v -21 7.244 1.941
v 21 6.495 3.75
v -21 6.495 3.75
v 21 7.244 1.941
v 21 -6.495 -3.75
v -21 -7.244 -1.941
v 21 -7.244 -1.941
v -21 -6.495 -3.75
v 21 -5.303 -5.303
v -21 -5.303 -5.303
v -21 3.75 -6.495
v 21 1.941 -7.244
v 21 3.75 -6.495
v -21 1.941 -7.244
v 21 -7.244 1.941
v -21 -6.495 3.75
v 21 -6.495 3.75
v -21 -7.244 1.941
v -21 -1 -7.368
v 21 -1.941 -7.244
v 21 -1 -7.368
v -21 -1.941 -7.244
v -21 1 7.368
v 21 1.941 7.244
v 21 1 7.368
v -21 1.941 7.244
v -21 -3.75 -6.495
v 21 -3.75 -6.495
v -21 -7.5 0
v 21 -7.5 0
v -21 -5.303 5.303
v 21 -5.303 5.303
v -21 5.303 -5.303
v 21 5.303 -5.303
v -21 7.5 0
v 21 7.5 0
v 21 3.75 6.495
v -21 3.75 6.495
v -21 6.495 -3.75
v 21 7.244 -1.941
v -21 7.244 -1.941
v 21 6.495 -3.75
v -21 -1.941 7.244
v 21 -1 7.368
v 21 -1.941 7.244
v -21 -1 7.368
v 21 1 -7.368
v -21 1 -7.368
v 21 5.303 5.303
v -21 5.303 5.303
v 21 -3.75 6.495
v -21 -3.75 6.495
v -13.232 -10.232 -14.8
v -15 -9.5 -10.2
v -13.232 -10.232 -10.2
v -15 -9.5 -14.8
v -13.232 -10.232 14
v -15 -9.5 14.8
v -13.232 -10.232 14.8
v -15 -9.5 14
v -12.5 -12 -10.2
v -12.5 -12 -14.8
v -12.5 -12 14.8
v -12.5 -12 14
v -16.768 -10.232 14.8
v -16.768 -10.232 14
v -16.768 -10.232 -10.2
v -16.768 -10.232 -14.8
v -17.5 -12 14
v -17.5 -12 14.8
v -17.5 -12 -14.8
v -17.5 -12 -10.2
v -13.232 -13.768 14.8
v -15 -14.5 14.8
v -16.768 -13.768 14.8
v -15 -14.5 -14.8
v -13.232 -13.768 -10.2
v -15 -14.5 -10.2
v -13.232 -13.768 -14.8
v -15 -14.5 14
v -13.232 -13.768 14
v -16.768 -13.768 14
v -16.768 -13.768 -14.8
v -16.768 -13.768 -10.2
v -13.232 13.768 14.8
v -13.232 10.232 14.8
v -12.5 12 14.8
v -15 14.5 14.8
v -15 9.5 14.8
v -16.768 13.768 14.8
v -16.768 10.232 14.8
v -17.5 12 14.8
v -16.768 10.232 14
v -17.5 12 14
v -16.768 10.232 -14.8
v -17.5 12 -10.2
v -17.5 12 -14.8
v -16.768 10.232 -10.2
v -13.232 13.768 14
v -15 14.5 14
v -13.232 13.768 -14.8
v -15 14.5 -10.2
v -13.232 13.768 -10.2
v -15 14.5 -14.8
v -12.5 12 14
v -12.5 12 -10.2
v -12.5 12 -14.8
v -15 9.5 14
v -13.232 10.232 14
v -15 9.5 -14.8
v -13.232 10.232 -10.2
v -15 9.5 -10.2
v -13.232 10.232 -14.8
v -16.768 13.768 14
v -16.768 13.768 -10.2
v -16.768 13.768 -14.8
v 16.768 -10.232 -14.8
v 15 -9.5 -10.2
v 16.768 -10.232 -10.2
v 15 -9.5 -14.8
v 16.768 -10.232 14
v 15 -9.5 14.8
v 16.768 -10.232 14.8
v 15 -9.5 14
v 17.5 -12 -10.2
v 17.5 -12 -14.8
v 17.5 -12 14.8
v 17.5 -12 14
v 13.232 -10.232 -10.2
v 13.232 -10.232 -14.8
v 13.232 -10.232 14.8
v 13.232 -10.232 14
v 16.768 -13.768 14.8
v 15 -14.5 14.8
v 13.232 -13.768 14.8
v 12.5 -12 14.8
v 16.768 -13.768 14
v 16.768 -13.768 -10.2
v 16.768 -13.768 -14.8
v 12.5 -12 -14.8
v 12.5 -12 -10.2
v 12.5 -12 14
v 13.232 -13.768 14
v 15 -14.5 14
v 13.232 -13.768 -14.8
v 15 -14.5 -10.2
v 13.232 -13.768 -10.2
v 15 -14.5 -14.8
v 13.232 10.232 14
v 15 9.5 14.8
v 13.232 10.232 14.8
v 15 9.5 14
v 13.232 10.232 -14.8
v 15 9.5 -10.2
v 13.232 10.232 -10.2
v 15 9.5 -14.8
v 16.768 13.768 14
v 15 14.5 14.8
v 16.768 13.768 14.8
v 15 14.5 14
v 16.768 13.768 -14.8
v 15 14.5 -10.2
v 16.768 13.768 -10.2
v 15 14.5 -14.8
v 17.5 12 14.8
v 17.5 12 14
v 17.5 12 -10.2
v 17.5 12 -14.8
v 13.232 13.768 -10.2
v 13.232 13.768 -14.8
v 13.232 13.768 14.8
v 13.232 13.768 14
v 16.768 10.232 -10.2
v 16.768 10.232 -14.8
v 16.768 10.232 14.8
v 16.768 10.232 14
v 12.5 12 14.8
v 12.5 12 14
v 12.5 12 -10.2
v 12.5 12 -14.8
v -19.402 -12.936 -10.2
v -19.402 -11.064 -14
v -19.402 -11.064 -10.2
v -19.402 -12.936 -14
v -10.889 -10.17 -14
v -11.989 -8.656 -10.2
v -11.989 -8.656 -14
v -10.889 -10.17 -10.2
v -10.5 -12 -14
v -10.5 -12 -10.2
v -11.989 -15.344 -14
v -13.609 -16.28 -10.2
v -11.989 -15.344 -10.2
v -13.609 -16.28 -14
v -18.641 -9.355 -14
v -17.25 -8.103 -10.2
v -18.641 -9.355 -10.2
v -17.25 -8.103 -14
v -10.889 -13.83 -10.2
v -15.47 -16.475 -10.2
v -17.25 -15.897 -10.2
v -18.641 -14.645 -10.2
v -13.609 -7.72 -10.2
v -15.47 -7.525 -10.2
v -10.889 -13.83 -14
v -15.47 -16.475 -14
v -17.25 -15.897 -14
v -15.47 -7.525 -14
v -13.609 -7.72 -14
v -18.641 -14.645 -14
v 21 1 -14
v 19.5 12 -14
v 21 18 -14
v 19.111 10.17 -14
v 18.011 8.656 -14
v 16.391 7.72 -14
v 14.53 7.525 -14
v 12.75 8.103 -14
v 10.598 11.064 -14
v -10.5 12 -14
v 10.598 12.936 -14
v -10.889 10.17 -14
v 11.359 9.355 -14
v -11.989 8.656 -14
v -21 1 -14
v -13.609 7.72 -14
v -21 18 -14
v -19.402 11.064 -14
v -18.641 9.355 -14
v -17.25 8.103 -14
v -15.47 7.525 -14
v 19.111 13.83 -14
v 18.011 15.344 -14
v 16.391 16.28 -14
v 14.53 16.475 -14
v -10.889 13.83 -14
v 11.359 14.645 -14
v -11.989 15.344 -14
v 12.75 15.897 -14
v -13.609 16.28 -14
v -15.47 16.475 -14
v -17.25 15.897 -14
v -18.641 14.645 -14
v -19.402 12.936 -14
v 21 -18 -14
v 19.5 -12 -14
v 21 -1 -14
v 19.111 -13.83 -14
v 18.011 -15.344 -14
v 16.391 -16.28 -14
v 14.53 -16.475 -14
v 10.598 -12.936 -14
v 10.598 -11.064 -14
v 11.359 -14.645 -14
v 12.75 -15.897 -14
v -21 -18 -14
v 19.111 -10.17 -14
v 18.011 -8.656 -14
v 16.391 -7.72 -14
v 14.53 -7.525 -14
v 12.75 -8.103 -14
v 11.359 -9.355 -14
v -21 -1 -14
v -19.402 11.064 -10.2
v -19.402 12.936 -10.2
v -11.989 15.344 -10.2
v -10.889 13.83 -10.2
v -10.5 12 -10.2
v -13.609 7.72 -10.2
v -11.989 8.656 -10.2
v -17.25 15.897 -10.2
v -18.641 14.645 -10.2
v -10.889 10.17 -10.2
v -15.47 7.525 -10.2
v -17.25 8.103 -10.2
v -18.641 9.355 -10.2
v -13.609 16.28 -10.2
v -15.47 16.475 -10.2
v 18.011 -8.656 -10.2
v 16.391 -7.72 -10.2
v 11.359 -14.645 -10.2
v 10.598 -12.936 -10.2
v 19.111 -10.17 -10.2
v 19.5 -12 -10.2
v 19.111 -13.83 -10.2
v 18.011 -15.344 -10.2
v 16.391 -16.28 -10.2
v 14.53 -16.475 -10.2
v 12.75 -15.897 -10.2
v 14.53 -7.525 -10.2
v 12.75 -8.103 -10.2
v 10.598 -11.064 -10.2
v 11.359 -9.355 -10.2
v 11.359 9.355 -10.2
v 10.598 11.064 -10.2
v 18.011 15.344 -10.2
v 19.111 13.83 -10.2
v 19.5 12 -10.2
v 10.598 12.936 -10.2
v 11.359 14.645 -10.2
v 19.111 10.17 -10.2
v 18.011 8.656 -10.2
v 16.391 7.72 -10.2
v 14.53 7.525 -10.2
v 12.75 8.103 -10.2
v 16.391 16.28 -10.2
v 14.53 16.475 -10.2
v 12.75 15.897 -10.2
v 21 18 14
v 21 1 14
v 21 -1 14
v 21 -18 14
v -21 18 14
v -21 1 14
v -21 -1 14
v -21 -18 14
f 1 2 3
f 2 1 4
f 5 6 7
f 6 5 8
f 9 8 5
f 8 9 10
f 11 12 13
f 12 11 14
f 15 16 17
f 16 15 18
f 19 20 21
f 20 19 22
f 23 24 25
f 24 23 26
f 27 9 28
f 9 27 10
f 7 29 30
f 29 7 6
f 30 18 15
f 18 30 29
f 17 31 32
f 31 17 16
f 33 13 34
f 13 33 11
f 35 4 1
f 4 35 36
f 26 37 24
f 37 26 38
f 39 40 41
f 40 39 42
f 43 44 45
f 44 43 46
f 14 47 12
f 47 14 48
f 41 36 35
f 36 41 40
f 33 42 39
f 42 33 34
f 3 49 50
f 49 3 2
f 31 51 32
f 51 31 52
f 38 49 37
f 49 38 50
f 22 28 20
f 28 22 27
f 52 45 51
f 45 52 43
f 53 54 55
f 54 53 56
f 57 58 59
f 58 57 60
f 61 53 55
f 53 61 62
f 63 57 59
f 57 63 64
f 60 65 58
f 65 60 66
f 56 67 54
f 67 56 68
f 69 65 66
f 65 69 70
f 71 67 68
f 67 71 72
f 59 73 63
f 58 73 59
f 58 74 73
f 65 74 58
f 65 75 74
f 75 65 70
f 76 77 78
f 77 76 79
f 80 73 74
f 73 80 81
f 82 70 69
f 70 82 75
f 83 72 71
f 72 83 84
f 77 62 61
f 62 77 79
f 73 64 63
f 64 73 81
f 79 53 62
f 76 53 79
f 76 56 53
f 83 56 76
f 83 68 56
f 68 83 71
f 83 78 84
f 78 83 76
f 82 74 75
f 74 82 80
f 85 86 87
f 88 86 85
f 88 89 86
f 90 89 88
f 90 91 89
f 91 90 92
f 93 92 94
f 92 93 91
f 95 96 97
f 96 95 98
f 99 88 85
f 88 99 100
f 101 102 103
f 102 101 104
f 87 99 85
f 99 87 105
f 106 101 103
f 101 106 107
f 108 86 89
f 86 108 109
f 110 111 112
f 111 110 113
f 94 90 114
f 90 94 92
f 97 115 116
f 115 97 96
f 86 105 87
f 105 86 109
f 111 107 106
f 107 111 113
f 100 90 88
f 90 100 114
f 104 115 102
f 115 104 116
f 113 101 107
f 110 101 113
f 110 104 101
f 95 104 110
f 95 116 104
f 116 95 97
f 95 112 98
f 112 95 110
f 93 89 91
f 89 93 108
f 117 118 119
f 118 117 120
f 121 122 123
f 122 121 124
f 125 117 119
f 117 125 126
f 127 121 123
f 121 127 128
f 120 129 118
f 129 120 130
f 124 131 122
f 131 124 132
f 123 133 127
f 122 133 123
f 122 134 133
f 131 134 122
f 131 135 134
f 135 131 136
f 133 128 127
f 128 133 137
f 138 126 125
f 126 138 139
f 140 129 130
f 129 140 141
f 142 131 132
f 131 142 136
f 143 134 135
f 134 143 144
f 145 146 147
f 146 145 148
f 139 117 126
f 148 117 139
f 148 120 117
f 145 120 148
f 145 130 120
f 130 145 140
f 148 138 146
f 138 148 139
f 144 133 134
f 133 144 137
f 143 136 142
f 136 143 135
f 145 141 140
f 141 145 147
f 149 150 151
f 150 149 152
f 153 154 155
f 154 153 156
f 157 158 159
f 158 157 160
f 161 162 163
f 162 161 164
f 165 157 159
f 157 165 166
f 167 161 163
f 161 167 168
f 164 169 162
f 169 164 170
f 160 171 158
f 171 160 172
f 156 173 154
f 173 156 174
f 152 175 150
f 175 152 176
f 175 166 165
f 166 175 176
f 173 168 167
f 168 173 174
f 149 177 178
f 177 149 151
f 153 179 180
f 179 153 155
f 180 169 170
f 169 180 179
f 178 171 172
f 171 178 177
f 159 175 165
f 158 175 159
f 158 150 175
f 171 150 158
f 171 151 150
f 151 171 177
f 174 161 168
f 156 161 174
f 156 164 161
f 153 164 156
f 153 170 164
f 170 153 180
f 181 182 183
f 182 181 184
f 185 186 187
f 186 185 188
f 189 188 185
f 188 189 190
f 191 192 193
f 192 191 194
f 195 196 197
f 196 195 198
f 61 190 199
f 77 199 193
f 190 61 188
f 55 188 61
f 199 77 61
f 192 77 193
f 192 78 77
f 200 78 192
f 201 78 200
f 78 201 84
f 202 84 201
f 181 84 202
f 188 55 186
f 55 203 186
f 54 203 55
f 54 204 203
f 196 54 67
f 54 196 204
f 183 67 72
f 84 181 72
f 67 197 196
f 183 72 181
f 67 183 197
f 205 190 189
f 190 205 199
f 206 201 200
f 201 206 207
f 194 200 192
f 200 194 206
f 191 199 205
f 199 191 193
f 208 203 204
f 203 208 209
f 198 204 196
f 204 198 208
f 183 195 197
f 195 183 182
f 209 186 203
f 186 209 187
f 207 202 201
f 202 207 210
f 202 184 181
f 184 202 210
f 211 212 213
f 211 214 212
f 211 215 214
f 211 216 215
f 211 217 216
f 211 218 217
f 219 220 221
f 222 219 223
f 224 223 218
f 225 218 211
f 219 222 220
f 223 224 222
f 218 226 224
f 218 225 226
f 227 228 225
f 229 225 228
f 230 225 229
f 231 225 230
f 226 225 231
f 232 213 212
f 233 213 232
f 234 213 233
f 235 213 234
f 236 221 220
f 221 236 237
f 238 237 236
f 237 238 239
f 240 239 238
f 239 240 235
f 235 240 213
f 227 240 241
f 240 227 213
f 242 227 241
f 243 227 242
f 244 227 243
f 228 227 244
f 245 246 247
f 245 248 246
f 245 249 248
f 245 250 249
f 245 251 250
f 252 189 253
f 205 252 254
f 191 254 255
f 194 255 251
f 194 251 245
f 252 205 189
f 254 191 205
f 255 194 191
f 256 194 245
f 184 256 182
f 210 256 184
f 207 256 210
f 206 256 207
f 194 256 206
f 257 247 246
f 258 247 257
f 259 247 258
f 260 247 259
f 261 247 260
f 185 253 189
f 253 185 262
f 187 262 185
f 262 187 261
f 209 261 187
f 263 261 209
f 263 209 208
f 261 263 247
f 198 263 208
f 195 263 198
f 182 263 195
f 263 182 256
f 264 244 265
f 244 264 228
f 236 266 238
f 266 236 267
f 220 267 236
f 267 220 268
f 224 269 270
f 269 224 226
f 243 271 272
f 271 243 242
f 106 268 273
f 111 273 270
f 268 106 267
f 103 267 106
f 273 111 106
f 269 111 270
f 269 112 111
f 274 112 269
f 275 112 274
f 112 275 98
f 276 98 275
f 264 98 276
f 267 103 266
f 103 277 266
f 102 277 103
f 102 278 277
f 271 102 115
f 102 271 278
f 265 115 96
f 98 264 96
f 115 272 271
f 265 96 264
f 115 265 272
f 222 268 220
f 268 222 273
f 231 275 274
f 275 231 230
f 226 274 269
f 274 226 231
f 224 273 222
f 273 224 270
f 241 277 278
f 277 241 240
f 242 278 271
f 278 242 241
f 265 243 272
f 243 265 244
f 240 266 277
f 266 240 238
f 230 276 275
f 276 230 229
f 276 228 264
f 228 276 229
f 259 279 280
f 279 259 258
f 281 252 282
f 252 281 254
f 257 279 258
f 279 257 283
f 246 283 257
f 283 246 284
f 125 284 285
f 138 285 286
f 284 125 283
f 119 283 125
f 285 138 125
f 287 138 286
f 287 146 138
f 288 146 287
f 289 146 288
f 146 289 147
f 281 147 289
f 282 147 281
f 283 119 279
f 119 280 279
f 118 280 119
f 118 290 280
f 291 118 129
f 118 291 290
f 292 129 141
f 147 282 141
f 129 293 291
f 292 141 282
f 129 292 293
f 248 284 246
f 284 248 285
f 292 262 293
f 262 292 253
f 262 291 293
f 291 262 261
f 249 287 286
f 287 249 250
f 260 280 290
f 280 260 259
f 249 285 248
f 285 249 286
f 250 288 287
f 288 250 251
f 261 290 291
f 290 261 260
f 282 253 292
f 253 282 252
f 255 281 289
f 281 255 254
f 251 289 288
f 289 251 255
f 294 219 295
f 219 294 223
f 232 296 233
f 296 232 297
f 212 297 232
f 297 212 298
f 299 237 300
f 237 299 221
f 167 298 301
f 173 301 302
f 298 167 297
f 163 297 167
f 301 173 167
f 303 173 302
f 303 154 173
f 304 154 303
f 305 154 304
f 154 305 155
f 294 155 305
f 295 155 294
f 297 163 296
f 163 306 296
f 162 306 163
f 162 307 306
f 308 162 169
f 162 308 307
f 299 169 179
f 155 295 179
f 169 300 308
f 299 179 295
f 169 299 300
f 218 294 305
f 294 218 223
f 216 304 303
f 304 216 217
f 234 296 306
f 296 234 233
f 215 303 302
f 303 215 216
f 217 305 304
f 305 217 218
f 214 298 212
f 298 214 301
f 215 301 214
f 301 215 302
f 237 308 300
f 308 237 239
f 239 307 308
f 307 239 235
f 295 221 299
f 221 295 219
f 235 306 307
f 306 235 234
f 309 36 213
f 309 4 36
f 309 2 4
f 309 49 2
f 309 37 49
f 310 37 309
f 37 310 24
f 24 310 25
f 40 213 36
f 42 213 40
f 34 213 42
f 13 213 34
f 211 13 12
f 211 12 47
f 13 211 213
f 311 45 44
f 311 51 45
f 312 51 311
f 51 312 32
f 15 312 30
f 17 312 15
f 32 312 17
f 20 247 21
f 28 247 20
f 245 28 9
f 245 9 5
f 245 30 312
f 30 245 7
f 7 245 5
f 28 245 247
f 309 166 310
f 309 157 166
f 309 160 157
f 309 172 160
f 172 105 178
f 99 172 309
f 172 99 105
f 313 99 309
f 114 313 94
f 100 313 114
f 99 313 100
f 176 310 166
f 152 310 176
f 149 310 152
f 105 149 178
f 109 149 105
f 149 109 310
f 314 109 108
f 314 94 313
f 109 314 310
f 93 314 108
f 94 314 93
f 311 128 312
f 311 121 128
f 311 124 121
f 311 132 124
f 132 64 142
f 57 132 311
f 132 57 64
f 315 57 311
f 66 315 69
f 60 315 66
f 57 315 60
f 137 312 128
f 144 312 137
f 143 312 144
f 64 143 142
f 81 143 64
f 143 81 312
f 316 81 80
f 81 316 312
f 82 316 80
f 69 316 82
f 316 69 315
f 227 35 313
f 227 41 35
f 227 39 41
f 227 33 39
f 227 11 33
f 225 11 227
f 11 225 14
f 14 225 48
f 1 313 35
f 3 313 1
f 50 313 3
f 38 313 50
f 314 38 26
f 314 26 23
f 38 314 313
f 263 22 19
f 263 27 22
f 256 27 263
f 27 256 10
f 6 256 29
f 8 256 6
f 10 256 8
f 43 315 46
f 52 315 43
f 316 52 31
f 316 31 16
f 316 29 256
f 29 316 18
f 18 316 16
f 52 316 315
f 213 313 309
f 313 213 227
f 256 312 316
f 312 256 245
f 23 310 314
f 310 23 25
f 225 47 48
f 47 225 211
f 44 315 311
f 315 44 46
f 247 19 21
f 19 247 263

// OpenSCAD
// Parameters
shaft_diameter_mm = 8; //[4:16:0.1]
block_length_mm = 42; //[21:84:0.5]
block_width_mm = 36; //[18:72:0.5]
block_height_mm = 28; //[14:56:0.5]
bearing_outer_diameter_mm = 15; //[10:30:0.1]
bearing_length_mm = 24; //[12:48:0.5]
bearing_bore_clearance_mm = 0; //[-0.2:0.5:0.01]
mounting_hole_diameter_mm = 5; //[3:8:0.1]
mounting_hole_spacing_x_mm = 30; //[18:60:0.5]
mounting_hole_spacing_y_mm = 24; //[14:50:0.5]
mounting_counterbore_diameter_mm = 9; //[6:16:0.1]
mounting_counterbore_depth_mm = 3; //[0:10:0.1]
clamp_slot_width_mm = 2; //[1:6:0.1]
fillet_radius_mm = 1; //[0:4:0.1]
eps_mm = 0.8; //[0.2:2:0.1]

// SBR Bearing Block - complete geometry
module sbr_bearing_block() {
  color([0.85, 0.85, 0.8]) {
    difference() {
      // Block body
      cube([block_length_mm, block_width_mm, block_height_mm], center=true);
      
      // Bearing bore with shaft relief
      union() {
        rotate([0, 90, 0]) translate([0, 0, 0])
          cylinder(h=block_length_mm + 2*eps_mm, r=(bearing_outer_diameter_mm + bearing_bore_clearance_mm)/2, center=true);
        rotate([0, 90, 0]) translate([0, 0, 0])
          cylinder(h=block_length_mm + 2*eps_mm, r=shaft_diameter_mm/2, center=true);
      }
      
      // Mounting holes
      for (x = [-1, 1], y = [-1, 1]) {
        translate([x * mounting_hole_spacing_x_mm/2, y * mounting_hole_spacing_y_mm/2, 0])
          cylinder(h=block_height_mm + 2*eps_mm, r=mounting_hole_diameter_mm/2, center=true);
      }
      
      // Counterbores
      for (x = [-1, 1], y = [-1, 1]) {
        translate([x * mounting_hole_spacing_x_mm/2, y * mounting_hole_spacing_y_mm/2, -block_height_mm/2 + (mounting_counterbore_depth_mm + eps_mm)/2])
          cylinder(h=mounting_counterbore_depth_mm + eps_mm, r=mounting_counterbore_diameter_mm/2, center=true);
      }
      
      // Clamp slot
      translate([0, 0, 0])
        cube([block_length_mm + 2*eps_mm, clamp_slot_width_mm, block_height_mm + 2*eps_mm], center=true);
    }
  }
}

// SCS Bearing Block - complete geometry
module scs_bearing_block() {
  color([0.85, 0.85, 0.8]) {
    sbr_bearing_block();
  }
}

// SCS Bearing Block Hole Positions - complete geometry
module scs_bearing_block_hole_positions() {
  color([0.85, 0.85, 0.8]) {
    for (x = [-1, 1], y = [-1, 1]) {
      translate([x * mounting_hole_spacing_x_mm/2, y * mounting_hole_spacing_y_mm/2, 0])
        cylinder(h=block_height_mm + 2*eps_mm, r=mounting_hole_diameter_mm/2, center=true);
    }
  }
}

// SBR Bearing Block Assembly - complete geometry
module sbr_bearing_block_assembly() {
  color([0.85, 0.85, 0.8]) {
    sbr_bearing_block();
    scs_bearing_block_hole_positions();
  }
}

// Assembly
module assembly() {
  sbr_bearing_block_assembly();
}

assembly();
